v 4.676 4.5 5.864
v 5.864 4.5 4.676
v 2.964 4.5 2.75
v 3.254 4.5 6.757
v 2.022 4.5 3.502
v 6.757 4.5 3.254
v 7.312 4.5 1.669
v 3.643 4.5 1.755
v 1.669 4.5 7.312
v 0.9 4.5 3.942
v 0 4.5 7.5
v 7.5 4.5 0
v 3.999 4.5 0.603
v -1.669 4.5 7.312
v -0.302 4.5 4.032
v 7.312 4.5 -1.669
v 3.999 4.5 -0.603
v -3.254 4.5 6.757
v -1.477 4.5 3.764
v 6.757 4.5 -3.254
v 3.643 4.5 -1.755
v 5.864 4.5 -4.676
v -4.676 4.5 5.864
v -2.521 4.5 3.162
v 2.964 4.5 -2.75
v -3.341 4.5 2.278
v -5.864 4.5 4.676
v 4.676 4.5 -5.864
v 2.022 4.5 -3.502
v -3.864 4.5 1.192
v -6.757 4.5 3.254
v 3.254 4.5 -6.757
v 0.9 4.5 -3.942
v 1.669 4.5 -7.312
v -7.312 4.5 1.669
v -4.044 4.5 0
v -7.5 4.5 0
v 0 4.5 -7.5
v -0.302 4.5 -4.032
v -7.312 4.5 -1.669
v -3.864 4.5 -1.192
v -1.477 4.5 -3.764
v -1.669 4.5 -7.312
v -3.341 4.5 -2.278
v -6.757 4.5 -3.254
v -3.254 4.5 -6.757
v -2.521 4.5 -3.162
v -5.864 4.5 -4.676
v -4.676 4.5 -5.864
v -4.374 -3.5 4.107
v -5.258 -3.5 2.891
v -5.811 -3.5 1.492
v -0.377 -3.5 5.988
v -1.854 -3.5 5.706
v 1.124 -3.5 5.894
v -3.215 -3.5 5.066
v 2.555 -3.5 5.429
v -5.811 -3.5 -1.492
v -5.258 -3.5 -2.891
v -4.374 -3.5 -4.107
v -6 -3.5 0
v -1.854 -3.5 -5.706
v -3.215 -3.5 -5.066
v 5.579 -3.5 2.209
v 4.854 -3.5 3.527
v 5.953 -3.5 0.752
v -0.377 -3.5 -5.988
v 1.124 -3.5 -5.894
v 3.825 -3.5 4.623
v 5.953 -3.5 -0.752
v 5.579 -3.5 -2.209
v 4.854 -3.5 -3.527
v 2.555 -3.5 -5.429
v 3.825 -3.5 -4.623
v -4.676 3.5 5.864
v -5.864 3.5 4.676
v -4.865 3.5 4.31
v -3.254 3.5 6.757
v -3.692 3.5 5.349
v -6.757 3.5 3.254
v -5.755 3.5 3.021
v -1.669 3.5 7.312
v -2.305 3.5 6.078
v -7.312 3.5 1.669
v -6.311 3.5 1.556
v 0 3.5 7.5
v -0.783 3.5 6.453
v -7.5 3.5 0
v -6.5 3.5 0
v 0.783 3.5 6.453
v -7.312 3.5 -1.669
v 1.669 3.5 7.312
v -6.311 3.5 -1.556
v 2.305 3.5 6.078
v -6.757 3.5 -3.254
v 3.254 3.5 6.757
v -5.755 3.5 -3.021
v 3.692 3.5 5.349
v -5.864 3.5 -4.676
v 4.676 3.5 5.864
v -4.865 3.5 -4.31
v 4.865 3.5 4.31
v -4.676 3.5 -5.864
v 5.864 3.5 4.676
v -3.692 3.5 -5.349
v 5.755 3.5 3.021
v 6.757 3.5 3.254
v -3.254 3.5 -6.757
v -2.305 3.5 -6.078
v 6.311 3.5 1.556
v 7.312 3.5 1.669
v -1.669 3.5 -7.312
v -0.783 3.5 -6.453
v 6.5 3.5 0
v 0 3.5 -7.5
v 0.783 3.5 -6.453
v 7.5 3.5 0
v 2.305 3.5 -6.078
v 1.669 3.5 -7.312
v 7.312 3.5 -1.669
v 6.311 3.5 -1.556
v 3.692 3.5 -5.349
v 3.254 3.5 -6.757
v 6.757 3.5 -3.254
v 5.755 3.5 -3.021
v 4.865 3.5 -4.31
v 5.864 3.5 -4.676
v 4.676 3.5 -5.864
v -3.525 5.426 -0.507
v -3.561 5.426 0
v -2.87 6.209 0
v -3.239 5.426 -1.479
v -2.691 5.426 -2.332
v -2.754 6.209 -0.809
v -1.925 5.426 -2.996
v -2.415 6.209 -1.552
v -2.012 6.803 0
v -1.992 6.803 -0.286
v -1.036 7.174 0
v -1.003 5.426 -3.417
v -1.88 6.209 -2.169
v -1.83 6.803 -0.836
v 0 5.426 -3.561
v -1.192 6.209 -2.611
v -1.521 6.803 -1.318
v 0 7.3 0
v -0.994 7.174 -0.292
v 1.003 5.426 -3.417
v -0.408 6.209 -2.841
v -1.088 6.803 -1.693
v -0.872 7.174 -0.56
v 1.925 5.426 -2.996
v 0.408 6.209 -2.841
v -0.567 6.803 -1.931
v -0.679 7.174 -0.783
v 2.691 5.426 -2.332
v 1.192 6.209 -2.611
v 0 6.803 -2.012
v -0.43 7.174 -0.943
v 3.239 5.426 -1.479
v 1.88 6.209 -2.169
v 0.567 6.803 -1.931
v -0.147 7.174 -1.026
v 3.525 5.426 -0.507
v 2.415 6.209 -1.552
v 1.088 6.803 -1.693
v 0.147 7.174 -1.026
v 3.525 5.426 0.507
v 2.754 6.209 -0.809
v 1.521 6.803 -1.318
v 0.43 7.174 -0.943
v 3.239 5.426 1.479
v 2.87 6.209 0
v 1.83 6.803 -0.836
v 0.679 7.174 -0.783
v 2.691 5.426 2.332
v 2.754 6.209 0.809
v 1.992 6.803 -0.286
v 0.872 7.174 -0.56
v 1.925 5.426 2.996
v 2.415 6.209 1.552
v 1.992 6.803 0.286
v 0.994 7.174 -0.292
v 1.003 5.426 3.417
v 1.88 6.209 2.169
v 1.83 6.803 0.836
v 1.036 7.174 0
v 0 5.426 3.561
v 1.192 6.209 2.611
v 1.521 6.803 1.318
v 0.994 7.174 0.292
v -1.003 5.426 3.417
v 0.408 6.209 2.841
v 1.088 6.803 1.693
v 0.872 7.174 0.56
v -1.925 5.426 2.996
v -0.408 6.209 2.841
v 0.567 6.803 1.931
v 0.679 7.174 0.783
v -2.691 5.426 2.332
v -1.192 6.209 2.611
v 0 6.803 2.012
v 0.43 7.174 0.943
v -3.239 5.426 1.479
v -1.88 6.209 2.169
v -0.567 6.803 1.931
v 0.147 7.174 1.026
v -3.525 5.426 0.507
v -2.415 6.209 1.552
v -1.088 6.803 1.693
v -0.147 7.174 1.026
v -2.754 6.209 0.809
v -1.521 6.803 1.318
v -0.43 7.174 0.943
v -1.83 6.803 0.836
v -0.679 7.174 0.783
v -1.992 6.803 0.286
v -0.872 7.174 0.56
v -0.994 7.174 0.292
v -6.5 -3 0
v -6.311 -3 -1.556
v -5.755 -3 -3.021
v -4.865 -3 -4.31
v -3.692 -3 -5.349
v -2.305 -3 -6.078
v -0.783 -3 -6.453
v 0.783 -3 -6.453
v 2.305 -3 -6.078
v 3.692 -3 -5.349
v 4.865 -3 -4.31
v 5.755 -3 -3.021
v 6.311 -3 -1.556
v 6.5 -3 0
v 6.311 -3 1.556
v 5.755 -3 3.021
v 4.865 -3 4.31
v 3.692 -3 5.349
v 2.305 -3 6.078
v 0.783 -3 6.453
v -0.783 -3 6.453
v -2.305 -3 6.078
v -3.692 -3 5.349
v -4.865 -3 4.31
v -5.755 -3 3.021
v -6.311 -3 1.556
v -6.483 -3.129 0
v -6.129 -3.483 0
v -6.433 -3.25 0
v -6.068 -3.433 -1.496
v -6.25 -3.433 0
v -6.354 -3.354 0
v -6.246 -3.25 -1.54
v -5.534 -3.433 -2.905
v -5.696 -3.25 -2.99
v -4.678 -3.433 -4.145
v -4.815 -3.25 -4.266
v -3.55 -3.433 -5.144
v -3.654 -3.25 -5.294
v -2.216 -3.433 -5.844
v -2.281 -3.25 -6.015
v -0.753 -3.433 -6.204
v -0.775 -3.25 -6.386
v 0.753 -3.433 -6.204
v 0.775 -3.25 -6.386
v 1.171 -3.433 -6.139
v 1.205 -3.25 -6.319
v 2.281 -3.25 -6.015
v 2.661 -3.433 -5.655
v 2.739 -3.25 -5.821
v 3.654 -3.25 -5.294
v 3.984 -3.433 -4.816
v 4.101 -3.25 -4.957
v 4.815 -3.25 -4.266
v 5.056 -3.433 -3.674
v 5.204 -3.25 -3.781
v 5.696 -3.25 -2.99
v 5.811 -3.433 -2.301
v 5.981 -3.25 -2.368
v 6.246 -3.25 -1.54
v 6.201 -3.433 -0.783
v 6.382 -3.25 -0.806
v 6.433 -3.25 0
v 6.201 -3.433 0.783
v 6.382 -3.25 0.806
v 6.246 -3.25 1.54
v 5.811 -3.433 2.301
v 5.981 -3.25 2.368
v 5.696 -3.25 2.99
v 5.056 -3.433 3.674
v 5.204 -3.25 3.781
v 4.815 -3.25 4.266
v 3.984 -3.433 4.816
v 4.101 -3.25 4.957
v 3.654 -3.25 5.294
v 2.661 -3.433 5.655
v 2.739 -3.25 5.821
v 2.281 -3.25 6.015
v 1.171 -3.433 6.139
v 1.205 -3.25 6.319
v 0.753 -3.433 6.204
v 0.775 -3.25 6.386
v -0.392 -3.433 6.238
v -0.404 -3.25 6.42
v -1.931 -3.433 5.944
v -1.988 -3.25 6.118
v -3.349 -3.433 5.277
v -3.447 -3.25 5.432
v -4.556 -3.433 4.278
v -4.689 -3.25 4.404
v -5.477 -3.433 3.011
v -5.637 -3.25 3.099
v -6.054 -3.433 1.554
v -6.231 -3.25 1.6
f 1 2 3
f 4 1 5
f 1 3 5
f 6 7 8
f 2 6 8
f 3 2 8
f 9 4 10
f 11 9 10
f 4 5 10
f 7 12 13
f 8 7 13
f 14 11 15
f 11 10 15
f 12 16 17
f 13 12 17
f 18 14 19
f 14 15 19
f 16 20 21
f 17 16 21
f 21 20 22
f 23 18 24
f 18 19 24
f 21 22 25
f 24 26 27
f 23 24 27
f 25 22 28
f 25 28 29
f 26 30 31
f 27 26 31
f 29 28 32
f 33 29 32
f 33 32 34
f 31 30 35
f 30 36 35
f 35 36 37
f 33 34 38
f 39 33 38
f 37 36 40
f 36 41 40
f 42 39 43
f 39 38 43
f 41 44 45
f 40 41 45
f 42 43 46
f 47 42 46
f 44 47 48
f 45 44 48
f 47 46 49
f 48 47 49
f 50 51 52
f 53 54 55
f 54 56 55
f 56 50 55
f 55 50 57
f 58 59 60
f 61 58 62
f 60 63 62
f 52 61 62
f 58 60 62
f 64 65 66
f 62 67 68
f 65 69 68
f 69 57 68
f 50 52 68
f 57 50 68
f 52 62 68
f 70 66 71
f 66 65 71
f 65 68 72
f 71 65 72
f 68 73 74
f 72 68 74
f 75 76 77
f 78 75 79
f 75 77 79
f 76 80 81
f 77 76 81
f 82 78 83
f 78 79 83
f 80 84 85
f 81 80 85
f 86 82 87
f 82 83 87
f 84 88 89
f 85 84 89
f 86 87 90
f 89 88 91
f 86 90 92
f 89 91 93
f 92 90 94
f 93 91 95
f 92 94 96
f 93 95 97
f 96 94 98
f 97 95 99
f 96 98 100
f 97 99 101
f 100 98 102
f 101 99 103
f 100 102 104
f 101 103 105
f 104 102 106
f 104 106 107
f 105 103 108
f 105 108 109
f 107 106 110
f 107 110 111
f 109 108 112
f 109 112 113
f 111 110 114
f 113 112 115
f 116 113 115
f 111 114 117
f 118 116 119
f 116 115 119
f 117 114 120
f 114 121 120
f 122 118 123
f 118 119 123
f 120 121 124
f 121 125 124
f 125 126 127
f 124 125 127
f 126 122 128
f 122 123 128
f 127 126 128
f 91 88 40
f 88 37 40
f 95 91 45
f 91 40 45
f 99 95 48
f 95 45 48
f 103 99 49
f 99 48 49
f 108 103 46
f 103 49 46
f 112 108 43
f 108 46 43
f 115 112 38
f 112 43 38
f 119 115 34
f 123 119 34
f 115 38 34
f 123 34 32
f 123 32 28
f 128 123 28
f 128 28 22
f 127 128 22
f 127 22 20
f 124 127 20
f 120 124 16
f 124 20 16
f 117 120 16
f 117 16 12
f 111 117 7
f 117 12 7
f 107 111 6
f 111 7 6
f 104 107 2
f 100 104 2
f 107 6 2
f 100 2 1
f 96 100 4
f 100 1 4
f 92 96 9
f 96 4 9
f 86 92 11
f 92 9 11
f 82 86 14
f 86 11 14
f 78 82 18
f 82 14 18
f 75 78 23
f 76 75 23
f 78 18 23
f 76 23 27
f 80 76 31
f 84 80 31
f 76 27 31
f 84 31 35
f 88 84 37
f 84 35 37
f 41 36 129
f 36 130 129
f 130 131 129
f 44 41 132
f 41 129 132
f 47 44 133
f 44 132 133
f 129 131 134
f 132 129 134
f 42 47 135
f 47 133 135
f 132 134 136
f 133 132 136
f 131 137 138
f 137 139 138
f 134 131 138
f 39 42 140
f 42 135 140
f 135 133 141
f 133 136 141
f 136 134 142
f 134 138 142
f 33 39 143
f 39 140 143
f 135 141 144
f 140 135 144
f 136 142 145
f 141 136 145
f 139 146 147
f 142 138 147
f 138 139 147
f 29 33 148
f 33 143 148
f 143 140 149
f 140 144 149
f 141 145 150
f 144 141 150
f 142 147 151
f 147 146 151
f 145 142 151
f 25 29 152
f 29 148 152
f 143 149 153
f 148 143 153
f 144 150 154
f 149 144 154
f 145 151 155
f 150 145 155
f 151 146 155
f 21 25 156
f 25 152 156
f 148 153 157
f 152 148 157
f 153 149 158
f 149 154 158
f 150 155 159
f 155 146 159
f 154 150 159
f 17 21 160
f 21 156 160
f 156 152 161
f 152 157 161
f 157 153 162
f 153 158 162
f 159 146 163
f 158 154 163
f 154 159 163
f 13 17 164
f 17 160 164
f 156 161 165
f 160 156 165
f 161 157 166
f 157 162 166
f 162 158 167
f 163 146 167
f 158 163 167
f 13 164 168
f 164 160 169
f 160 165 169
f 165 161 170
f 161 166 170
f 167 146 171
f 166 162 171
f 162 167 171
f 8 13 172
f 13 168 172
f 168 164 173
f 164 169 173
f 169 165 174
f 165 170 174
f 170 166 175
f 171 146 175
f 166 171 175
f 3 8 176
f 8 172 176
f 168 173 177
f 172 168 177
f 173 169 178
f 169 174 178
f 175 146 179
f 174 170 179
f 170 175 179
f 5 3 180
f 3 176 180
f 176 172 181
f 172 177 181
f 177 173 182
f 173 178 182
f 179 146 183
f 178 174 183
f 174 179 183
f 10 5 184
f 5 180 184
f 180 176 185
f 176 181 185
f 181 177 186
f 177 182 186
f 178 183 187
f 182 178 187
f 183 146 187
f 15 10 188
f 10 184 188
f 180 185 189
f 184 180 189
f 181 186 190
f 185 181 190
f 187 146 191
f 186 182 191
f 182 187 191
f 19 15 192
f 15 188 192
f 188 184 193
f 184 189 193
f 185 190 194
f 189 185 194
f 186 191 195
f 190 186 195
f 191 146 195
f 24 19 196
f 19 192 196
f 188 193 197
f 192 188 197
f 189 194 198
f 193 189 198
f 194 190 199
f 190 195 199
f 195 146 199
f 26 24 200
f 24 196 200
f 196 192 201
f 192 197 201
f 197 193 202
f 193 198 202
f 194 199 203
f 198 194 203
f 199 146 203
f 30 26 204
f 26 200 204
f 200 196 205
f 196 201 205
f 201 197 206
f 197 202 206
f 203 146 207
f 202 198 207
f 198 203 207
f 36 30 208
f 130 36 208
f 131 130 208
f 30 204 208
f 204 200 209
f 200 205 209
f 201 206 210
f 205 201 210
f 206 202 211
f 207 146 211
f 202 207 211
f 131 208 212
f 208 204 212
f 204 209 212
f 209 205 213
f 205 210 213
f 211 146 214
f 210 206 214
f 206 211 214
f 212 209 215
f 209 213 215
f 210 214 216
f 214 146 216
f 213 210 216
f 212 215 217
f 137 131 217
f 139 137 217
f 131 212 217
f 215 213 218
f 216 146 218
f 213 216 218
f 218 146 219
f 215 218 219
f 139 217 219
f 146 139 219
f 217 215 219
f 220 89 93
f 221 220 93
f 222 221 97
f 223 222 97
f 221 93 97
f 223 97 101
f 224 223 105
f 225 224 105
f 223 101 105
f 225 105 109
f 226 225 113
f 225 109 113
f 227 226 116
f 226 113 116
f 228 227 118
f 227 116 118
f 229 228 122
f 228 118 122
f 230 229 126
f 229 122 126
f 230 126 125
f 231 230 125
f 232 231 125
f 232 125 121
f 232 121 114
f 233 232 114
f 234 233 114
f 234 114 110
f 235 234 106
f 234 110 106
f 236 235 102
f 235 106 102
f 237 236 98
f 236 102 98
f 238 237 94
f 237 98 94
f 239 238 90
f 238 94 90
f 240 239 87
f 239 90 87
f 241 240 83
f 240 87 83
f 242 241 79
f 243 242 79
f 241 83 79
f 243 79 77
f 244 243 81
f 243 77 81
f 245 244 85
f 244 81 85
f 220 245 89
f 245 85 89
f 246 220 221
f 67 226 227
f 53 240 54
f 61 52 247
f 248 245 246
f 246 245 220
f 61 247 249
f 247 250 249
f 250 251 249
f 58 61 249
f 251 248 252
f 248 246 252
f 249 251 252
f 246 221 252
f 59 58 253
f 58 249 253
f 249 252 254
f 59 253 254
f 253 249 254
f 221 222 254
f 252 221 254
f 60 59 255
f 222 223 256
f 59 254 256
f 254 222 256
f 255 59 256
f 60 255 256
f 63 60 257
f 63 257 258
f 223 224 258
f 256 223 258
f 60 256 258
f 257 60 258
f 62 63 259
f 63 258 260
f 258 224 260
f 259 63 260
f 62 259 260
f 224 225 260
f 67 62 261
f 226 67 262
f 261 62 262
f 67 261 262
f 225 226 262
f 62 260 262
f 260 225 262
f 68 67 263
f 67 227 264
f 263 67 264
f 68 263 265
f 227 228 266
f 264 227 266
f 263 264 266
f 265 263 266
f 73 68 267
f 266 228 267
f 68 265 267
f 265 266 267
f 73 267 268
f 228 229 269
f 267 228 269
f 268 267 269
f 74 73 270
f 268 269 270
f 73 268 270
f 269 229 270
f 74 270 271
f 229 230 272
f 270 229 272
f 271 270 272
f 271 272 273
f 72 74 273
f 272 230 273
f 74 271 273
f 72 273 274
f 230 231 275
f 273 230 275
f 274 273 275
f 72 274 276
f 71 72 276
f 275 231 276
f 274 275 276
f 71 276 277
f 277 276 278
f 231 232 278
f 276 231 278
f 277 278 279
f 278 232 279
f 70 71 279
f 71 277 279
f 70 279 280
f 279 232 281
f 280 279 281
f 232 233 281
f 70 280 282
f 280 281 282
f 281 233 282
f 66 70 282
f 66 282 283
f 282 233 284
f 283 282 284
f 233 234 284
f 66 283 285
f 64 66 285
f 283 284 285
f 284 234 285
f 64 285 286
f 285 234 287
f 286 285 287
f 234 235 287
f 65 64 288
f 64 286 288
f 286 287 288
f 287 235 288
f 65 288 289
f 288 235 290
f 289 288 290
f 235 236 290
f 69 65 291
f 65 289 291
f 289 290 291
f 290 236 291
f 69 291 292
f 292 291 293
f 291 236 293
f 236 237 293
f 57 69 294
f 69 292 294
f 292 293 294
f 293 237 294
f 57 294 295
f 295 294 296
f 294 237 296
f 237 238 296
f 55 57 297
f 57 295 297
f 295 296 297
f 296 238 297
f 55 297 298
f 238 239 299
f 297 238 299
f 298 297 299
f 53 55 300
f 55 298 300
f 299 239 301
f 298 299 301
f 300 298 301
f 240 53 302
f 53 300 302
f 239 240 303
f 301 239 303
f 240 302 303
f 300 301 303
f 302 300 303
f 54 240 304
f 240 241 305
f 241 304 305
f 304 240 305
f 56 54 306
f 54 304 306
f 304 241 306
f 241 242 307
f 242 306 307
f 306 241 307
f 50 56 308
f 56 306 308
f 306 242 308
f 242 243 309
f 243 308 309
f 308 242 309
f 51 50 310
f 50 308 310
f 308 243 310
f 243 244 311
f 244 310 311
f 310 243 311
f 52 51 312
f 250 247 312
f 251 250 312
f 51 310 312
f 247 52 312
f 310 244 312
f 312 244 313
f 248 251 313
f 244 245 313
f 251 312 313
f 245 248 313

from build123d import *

# Parameters (mm, degrees)
FILLET1_R = 0.5


with BuildPart() as part:
    # Sketch1 → Revolve2 (revolve)
    with BuildSketch(Plane.XY):
        with BuildLine():
            Line((-6.5, 3.5), (-7.5, 3.5))
            Line((-7.5, 3.5), (-7.5, 4.5))
            Line((-7.5, 4.5), (-4.043760626, 4.5))
            ThreePointArc((-4.043760626, 4.5), (-2.459268184, 6.531675661), (0, 7.3))
            Line((0, 7.3), (0, -3.5))
            Line((0, -3.5), (-6.5, -3.5))
            Line((-6.5, -3.5), (-6.5, 3.5))
        make_face()
    revolve(axis=Axis((0, 7.3, 0), (0, -1, 0)))

    # Fillet1
    fillet1_edges = [part.edges().sort_by_distance(p)[0] for p in [
        (6.5, -3.5, 0),
    ]]
    fillet(fillet1_edges, radius=FILLET1_R)


solid = part.part
